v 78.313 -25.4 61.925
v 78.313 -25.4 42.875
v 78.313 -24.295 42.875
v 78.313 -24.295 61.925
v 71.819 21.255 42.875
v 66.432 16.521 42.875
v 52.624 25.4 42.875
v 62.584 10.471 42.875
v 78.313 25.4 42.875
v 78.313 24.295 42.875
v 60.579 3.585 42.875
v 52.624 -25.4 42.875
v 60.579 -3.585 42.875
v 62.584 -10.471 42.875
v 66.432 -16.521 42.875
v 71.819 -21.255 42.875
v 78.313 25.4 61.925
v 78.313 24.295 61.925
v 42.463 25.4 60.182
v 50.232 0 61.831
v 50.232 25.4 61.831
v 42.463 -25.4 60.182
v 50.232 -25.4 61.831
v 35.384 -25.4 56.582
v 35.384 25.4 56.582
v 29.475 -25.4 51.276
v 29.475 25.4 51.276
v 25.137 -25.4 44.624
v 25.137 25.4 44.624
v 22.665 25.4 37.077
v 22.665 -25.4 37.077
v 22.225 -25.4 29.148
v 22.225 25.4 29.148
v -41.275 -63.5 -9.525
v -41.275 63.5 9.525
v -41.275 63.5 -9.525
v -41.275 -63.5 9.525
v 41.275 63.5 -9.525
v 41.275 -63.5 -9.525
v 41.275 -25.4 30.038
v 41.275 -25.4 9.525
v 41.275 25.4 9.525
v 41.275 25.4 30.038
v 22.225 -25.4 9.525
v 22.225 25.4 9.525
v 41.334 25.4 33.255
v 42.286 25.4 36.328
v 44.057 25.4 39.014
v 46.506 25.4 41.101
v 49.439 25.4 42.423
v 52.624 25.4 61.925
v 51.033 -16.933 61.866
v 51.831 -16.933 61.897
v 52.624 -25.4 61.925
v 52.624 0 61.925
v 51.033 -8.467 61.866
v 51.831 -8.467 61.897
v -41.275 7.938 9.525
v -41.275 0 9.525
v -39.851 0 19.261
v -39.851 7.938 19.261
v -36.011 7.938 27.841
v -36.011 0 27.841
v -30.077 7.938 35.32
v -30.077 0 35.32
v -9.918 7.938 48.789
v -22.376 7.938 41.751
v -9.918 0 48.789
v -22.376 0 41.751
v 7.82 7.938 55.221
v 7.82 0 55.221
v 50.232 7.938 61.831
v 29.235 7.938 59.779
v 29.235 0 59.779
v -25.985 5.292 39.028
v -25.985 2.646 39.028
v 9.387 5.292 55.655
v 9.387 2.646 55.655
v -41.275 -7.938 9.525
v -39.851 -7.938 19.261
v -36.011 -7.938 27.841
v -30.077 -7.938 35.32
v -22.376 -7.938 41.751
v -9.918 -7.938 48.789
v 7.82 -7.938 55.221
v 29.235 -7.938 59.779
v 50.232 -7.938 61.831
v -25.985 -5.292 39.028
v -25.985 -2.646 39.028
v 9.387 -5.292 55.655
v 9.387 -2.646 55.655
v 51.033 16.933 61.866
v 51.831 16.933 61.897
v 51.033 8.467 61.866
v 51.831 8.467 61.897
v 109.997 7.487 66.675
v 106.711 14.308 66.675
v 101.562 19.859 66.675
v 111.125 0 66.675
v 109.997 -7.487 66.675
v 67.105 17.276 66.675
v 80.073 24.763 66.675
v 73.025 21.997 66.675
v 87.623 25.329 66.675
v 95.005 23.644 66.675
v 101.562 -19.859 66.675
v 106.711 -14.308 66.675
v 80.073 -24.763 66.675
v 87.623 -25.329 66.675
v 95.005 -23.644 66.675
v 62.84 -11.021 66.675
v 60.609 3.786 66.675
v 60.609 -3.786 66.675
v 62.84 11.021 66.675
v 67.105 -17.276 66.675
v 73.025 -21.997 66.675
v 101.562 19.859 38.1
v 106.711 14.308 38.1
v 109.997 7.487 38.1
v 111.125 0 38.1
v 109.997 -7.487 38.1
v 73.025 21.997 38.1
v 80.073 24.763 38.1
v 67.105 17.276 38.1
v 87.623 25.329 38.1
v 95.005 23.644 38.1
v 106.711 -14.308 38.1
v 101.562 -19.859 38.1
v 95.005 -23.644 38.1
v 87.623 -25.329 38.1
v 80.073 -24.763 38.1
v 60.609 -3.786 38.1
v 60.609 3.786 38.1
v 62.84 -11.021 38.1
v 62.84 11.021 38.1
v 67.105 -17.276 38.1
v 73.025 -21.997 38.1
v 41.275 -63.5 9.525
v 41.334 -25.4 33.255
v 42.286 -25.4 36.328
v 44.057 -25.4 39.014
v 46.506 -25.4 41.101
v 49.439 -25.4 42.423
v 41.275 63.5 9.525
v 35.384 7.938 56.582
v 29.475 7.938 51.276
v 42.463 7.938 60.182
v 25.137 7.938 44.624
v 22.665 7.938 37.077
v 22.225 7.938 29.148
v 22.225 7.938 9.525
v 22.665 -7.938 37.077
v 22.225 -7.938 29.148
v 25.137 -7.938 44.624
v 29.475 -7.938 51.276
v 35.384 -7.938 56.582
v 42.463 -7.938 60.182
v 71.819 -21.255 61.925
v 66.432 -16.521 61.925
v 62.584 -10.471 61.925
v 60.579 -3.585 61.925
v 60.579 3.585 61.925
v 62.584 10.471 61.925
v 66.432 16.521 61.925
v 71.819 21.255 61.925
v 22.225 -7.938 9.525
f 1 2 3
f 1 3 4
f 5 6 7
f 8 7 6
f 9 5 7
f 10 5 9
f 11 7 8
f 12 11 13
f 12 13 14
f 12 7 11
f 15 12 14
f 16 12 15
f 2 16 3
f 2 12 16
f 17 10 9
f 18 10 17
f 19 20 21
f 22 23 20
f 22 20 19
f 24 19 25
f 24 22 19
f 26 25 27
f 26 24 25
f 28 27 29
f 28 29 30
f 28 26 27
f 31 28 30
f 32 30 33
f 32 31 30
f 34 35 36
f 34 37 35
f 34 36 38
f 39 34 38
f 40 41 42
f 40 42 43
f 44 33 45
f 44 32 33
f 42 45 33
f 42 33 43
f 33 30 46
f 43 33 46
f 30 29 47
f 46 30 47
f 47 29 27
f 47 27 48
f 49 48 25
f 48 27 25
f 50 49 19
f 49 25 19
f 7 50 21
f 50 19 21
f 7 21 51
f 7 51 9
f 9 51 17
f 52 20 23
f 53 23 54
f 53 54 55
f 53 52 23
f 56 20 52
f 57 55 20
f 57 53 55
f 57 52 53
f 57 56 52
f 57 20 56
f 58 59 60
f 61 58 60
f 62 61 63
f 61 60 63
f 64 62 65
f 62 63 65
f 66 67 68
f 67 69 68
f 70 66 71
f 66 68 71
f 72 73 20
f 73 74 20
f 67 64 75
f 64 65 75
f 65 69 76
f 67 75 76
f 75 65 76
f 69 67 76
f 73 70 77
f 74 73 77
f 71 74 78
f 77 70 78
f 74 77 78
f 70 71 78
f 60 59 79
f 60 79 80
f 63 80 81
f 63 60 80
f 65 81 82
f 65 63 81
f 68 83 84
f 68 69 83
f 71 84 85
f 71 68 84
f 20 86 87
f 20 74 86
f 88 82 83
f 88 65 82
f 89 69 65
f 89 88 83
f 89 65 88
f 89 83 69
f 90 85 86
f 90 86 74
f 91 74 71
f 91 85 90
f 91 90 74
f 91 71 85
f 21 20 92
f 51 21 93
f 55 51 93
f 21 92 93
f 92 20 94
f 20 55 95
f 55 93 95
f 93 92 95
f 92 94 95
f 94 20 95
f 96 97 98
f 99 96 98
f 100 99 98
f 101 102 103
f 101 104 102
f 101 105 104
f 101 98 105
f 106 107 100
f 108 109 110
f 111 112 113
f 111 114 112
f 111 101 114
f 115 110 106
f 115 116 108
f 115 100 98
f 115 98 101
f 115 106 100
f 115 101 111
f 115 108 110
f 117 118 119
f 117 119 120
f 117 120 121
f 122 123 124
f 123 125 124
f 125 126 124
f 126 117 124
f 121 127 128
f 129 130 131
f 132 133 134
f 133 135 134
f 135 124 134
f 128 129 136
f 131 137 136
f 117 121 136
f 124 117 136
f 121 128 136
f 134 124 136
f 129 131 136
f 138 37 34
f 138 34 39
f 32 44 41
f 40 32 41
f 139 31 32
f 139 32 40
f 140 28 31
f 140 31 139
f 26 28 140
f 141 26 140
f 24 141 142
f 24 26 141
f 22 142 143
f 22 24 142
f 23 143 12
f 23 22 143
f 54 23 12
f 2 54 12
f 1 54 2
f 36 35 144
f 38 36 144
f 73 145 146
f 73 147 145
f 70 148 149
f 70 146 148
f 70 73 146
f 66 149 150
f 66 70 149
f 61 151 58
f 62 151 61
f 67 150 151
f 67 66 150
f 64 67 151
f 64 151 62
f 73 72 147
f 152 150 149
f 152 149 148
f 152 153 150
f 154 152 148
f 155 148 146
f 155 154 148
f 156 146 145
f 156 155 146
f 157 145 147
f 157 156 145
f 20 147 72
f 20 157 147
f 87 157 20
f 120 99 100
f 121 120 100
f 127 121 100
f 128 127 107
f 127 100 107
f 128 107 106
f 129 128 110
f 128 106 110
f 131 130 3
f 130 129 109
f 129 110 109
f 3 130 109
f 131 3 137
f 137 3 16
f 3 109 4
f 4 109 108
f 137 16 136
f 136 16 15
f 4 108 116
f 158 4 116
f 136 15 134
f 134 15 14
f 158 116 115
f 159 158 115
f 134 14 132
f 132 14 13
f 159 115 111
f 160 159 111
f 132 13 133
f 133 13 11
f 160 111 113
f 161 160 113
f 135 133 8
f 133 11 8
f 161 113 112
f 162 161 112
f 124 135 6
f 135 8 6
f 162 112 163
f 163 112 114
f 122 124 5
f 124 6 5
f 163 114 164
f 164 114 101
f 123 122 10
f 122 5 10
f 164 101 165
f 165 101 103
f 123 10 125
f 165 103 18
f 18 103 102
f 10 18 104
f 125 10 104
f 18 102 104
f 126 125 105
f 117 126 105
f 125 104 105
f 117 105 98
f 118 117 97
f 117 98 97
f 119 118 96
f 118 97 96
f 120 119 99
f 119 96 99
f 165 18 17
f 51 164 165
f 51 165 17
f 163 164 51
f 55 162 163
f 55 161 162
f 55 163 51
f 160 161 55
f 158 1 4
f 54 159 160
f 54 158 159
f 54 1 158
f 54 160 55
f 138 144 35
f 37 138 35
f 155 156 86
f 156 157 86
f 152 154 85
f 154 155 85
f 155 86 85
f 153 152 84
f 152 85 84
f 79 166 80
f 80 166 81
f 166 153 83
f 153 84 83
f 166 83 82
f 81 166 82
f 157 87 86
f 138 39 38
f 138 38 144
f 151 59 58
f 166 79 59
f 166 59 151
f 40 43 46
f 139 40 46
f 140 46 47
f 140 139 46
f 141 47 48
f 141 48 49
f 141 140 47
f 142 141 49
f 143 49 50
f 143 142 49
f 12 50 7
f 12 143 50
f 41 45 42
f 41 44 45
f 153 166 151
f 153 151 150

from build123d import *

# Parameters (mm, degrees)
F1_DEPTH = 63.5
F0_W     = 17.988366
F0_H     = 19.05
F2_DEPTH = 25.4
F3_DEPTH = 7.9375
F0_W_2   = 25.4
F0_H_2   = 28.575


with BuildPart() as f1:
    # F0 (on Front) → F1 (new body, symmetric)
    with BuildSketch(Plane.XZ):
        Polygon((-41.275, 9.525), (-41.275, -9.525), (41.275, -9.525), (41.275, 9.525), (22.225, 9.525), align=None)
    extrude(amount=F1_DEPTH, both=True)


with BuildPart() as f2:
    # F0 (on Front) → F2 (new body, symmetric)
    with BuildSketch(Plane.XZ):
        with BuildLine():
            Line((22.225, 9.525), (41.275, 9.525))
            Line((41.275, 9.525), (41.275, 30.037714))
            ThreePointArc((41.275, 30.037714), (44.05691, 39.013958), (52.624452, 42.8752))
            Line((52.624452, 42.8752), (60.325, 42.8752))
            Line((60.325, 42.8752), (60.325, 61.9252))
            Line((60.325, 61.9252), (52.624452, 61.9252))
            add(Edge.make_bspline(
                [(50.231625, 61.831148), (51.035338, 61.867656), (51.833143, 61.898975), (52.624452, 61.9252)],
                knots=[105.343724, 105.343724, 105.343724, 105.343724, 107.53087, 107.53087, 107.53087, 107.53087], degree=3))
            ThreePointArc((50.231625, 61.831148), (29.475375, 51.276284), (22.225, 29.14804))
            Line((22.225, 29.14804), (22.225, 9.525))
        make_face()
        with Locations((69.319183, 52.4002)):
            Rectangle(F0_W, F0_H)
    extrude(amount=F2_DEPTH, both=True)

    # F0 (on Front) → F4 (revolve)
    with BuildSketch(Plane.XZ):
        with Locations((98.425, 52.3875)):
            Rectangle(F0_W_2, F0_H_2)
    revolve(axis=Axis((85.725, 0, 52.3875), (0, 0, -1)))


with BuildPart() as f3:
    # F0 (on Front) → F3 (new body, symmetric)
    with BuildSketch(Plane.XZ):
        with BuildLine():
            add(Edge.make_bspline(
                [(-41.275, 9.525), (-40.895153, 46.27369), (11.520846, 60.072729), (50.231625, 61.831148)],
                knots=[0, 0, 0, 0, 105.343724, 105.343724, 105.343724, 105.343724], degree=3))
            Line((-41.275, 9.525), (22.225, 9.525))
            Line((22.225, 9.525), (22.225, 29.14804))
            ThreePointArc((22.225, 29.14804), (29.475375, 51.276284), (50.231625, 61.831148))
        make_face()
    extrude(amount=F3_DEPTH, both=True)


solid = Compound([f1.part, f2.part, f3.part])
